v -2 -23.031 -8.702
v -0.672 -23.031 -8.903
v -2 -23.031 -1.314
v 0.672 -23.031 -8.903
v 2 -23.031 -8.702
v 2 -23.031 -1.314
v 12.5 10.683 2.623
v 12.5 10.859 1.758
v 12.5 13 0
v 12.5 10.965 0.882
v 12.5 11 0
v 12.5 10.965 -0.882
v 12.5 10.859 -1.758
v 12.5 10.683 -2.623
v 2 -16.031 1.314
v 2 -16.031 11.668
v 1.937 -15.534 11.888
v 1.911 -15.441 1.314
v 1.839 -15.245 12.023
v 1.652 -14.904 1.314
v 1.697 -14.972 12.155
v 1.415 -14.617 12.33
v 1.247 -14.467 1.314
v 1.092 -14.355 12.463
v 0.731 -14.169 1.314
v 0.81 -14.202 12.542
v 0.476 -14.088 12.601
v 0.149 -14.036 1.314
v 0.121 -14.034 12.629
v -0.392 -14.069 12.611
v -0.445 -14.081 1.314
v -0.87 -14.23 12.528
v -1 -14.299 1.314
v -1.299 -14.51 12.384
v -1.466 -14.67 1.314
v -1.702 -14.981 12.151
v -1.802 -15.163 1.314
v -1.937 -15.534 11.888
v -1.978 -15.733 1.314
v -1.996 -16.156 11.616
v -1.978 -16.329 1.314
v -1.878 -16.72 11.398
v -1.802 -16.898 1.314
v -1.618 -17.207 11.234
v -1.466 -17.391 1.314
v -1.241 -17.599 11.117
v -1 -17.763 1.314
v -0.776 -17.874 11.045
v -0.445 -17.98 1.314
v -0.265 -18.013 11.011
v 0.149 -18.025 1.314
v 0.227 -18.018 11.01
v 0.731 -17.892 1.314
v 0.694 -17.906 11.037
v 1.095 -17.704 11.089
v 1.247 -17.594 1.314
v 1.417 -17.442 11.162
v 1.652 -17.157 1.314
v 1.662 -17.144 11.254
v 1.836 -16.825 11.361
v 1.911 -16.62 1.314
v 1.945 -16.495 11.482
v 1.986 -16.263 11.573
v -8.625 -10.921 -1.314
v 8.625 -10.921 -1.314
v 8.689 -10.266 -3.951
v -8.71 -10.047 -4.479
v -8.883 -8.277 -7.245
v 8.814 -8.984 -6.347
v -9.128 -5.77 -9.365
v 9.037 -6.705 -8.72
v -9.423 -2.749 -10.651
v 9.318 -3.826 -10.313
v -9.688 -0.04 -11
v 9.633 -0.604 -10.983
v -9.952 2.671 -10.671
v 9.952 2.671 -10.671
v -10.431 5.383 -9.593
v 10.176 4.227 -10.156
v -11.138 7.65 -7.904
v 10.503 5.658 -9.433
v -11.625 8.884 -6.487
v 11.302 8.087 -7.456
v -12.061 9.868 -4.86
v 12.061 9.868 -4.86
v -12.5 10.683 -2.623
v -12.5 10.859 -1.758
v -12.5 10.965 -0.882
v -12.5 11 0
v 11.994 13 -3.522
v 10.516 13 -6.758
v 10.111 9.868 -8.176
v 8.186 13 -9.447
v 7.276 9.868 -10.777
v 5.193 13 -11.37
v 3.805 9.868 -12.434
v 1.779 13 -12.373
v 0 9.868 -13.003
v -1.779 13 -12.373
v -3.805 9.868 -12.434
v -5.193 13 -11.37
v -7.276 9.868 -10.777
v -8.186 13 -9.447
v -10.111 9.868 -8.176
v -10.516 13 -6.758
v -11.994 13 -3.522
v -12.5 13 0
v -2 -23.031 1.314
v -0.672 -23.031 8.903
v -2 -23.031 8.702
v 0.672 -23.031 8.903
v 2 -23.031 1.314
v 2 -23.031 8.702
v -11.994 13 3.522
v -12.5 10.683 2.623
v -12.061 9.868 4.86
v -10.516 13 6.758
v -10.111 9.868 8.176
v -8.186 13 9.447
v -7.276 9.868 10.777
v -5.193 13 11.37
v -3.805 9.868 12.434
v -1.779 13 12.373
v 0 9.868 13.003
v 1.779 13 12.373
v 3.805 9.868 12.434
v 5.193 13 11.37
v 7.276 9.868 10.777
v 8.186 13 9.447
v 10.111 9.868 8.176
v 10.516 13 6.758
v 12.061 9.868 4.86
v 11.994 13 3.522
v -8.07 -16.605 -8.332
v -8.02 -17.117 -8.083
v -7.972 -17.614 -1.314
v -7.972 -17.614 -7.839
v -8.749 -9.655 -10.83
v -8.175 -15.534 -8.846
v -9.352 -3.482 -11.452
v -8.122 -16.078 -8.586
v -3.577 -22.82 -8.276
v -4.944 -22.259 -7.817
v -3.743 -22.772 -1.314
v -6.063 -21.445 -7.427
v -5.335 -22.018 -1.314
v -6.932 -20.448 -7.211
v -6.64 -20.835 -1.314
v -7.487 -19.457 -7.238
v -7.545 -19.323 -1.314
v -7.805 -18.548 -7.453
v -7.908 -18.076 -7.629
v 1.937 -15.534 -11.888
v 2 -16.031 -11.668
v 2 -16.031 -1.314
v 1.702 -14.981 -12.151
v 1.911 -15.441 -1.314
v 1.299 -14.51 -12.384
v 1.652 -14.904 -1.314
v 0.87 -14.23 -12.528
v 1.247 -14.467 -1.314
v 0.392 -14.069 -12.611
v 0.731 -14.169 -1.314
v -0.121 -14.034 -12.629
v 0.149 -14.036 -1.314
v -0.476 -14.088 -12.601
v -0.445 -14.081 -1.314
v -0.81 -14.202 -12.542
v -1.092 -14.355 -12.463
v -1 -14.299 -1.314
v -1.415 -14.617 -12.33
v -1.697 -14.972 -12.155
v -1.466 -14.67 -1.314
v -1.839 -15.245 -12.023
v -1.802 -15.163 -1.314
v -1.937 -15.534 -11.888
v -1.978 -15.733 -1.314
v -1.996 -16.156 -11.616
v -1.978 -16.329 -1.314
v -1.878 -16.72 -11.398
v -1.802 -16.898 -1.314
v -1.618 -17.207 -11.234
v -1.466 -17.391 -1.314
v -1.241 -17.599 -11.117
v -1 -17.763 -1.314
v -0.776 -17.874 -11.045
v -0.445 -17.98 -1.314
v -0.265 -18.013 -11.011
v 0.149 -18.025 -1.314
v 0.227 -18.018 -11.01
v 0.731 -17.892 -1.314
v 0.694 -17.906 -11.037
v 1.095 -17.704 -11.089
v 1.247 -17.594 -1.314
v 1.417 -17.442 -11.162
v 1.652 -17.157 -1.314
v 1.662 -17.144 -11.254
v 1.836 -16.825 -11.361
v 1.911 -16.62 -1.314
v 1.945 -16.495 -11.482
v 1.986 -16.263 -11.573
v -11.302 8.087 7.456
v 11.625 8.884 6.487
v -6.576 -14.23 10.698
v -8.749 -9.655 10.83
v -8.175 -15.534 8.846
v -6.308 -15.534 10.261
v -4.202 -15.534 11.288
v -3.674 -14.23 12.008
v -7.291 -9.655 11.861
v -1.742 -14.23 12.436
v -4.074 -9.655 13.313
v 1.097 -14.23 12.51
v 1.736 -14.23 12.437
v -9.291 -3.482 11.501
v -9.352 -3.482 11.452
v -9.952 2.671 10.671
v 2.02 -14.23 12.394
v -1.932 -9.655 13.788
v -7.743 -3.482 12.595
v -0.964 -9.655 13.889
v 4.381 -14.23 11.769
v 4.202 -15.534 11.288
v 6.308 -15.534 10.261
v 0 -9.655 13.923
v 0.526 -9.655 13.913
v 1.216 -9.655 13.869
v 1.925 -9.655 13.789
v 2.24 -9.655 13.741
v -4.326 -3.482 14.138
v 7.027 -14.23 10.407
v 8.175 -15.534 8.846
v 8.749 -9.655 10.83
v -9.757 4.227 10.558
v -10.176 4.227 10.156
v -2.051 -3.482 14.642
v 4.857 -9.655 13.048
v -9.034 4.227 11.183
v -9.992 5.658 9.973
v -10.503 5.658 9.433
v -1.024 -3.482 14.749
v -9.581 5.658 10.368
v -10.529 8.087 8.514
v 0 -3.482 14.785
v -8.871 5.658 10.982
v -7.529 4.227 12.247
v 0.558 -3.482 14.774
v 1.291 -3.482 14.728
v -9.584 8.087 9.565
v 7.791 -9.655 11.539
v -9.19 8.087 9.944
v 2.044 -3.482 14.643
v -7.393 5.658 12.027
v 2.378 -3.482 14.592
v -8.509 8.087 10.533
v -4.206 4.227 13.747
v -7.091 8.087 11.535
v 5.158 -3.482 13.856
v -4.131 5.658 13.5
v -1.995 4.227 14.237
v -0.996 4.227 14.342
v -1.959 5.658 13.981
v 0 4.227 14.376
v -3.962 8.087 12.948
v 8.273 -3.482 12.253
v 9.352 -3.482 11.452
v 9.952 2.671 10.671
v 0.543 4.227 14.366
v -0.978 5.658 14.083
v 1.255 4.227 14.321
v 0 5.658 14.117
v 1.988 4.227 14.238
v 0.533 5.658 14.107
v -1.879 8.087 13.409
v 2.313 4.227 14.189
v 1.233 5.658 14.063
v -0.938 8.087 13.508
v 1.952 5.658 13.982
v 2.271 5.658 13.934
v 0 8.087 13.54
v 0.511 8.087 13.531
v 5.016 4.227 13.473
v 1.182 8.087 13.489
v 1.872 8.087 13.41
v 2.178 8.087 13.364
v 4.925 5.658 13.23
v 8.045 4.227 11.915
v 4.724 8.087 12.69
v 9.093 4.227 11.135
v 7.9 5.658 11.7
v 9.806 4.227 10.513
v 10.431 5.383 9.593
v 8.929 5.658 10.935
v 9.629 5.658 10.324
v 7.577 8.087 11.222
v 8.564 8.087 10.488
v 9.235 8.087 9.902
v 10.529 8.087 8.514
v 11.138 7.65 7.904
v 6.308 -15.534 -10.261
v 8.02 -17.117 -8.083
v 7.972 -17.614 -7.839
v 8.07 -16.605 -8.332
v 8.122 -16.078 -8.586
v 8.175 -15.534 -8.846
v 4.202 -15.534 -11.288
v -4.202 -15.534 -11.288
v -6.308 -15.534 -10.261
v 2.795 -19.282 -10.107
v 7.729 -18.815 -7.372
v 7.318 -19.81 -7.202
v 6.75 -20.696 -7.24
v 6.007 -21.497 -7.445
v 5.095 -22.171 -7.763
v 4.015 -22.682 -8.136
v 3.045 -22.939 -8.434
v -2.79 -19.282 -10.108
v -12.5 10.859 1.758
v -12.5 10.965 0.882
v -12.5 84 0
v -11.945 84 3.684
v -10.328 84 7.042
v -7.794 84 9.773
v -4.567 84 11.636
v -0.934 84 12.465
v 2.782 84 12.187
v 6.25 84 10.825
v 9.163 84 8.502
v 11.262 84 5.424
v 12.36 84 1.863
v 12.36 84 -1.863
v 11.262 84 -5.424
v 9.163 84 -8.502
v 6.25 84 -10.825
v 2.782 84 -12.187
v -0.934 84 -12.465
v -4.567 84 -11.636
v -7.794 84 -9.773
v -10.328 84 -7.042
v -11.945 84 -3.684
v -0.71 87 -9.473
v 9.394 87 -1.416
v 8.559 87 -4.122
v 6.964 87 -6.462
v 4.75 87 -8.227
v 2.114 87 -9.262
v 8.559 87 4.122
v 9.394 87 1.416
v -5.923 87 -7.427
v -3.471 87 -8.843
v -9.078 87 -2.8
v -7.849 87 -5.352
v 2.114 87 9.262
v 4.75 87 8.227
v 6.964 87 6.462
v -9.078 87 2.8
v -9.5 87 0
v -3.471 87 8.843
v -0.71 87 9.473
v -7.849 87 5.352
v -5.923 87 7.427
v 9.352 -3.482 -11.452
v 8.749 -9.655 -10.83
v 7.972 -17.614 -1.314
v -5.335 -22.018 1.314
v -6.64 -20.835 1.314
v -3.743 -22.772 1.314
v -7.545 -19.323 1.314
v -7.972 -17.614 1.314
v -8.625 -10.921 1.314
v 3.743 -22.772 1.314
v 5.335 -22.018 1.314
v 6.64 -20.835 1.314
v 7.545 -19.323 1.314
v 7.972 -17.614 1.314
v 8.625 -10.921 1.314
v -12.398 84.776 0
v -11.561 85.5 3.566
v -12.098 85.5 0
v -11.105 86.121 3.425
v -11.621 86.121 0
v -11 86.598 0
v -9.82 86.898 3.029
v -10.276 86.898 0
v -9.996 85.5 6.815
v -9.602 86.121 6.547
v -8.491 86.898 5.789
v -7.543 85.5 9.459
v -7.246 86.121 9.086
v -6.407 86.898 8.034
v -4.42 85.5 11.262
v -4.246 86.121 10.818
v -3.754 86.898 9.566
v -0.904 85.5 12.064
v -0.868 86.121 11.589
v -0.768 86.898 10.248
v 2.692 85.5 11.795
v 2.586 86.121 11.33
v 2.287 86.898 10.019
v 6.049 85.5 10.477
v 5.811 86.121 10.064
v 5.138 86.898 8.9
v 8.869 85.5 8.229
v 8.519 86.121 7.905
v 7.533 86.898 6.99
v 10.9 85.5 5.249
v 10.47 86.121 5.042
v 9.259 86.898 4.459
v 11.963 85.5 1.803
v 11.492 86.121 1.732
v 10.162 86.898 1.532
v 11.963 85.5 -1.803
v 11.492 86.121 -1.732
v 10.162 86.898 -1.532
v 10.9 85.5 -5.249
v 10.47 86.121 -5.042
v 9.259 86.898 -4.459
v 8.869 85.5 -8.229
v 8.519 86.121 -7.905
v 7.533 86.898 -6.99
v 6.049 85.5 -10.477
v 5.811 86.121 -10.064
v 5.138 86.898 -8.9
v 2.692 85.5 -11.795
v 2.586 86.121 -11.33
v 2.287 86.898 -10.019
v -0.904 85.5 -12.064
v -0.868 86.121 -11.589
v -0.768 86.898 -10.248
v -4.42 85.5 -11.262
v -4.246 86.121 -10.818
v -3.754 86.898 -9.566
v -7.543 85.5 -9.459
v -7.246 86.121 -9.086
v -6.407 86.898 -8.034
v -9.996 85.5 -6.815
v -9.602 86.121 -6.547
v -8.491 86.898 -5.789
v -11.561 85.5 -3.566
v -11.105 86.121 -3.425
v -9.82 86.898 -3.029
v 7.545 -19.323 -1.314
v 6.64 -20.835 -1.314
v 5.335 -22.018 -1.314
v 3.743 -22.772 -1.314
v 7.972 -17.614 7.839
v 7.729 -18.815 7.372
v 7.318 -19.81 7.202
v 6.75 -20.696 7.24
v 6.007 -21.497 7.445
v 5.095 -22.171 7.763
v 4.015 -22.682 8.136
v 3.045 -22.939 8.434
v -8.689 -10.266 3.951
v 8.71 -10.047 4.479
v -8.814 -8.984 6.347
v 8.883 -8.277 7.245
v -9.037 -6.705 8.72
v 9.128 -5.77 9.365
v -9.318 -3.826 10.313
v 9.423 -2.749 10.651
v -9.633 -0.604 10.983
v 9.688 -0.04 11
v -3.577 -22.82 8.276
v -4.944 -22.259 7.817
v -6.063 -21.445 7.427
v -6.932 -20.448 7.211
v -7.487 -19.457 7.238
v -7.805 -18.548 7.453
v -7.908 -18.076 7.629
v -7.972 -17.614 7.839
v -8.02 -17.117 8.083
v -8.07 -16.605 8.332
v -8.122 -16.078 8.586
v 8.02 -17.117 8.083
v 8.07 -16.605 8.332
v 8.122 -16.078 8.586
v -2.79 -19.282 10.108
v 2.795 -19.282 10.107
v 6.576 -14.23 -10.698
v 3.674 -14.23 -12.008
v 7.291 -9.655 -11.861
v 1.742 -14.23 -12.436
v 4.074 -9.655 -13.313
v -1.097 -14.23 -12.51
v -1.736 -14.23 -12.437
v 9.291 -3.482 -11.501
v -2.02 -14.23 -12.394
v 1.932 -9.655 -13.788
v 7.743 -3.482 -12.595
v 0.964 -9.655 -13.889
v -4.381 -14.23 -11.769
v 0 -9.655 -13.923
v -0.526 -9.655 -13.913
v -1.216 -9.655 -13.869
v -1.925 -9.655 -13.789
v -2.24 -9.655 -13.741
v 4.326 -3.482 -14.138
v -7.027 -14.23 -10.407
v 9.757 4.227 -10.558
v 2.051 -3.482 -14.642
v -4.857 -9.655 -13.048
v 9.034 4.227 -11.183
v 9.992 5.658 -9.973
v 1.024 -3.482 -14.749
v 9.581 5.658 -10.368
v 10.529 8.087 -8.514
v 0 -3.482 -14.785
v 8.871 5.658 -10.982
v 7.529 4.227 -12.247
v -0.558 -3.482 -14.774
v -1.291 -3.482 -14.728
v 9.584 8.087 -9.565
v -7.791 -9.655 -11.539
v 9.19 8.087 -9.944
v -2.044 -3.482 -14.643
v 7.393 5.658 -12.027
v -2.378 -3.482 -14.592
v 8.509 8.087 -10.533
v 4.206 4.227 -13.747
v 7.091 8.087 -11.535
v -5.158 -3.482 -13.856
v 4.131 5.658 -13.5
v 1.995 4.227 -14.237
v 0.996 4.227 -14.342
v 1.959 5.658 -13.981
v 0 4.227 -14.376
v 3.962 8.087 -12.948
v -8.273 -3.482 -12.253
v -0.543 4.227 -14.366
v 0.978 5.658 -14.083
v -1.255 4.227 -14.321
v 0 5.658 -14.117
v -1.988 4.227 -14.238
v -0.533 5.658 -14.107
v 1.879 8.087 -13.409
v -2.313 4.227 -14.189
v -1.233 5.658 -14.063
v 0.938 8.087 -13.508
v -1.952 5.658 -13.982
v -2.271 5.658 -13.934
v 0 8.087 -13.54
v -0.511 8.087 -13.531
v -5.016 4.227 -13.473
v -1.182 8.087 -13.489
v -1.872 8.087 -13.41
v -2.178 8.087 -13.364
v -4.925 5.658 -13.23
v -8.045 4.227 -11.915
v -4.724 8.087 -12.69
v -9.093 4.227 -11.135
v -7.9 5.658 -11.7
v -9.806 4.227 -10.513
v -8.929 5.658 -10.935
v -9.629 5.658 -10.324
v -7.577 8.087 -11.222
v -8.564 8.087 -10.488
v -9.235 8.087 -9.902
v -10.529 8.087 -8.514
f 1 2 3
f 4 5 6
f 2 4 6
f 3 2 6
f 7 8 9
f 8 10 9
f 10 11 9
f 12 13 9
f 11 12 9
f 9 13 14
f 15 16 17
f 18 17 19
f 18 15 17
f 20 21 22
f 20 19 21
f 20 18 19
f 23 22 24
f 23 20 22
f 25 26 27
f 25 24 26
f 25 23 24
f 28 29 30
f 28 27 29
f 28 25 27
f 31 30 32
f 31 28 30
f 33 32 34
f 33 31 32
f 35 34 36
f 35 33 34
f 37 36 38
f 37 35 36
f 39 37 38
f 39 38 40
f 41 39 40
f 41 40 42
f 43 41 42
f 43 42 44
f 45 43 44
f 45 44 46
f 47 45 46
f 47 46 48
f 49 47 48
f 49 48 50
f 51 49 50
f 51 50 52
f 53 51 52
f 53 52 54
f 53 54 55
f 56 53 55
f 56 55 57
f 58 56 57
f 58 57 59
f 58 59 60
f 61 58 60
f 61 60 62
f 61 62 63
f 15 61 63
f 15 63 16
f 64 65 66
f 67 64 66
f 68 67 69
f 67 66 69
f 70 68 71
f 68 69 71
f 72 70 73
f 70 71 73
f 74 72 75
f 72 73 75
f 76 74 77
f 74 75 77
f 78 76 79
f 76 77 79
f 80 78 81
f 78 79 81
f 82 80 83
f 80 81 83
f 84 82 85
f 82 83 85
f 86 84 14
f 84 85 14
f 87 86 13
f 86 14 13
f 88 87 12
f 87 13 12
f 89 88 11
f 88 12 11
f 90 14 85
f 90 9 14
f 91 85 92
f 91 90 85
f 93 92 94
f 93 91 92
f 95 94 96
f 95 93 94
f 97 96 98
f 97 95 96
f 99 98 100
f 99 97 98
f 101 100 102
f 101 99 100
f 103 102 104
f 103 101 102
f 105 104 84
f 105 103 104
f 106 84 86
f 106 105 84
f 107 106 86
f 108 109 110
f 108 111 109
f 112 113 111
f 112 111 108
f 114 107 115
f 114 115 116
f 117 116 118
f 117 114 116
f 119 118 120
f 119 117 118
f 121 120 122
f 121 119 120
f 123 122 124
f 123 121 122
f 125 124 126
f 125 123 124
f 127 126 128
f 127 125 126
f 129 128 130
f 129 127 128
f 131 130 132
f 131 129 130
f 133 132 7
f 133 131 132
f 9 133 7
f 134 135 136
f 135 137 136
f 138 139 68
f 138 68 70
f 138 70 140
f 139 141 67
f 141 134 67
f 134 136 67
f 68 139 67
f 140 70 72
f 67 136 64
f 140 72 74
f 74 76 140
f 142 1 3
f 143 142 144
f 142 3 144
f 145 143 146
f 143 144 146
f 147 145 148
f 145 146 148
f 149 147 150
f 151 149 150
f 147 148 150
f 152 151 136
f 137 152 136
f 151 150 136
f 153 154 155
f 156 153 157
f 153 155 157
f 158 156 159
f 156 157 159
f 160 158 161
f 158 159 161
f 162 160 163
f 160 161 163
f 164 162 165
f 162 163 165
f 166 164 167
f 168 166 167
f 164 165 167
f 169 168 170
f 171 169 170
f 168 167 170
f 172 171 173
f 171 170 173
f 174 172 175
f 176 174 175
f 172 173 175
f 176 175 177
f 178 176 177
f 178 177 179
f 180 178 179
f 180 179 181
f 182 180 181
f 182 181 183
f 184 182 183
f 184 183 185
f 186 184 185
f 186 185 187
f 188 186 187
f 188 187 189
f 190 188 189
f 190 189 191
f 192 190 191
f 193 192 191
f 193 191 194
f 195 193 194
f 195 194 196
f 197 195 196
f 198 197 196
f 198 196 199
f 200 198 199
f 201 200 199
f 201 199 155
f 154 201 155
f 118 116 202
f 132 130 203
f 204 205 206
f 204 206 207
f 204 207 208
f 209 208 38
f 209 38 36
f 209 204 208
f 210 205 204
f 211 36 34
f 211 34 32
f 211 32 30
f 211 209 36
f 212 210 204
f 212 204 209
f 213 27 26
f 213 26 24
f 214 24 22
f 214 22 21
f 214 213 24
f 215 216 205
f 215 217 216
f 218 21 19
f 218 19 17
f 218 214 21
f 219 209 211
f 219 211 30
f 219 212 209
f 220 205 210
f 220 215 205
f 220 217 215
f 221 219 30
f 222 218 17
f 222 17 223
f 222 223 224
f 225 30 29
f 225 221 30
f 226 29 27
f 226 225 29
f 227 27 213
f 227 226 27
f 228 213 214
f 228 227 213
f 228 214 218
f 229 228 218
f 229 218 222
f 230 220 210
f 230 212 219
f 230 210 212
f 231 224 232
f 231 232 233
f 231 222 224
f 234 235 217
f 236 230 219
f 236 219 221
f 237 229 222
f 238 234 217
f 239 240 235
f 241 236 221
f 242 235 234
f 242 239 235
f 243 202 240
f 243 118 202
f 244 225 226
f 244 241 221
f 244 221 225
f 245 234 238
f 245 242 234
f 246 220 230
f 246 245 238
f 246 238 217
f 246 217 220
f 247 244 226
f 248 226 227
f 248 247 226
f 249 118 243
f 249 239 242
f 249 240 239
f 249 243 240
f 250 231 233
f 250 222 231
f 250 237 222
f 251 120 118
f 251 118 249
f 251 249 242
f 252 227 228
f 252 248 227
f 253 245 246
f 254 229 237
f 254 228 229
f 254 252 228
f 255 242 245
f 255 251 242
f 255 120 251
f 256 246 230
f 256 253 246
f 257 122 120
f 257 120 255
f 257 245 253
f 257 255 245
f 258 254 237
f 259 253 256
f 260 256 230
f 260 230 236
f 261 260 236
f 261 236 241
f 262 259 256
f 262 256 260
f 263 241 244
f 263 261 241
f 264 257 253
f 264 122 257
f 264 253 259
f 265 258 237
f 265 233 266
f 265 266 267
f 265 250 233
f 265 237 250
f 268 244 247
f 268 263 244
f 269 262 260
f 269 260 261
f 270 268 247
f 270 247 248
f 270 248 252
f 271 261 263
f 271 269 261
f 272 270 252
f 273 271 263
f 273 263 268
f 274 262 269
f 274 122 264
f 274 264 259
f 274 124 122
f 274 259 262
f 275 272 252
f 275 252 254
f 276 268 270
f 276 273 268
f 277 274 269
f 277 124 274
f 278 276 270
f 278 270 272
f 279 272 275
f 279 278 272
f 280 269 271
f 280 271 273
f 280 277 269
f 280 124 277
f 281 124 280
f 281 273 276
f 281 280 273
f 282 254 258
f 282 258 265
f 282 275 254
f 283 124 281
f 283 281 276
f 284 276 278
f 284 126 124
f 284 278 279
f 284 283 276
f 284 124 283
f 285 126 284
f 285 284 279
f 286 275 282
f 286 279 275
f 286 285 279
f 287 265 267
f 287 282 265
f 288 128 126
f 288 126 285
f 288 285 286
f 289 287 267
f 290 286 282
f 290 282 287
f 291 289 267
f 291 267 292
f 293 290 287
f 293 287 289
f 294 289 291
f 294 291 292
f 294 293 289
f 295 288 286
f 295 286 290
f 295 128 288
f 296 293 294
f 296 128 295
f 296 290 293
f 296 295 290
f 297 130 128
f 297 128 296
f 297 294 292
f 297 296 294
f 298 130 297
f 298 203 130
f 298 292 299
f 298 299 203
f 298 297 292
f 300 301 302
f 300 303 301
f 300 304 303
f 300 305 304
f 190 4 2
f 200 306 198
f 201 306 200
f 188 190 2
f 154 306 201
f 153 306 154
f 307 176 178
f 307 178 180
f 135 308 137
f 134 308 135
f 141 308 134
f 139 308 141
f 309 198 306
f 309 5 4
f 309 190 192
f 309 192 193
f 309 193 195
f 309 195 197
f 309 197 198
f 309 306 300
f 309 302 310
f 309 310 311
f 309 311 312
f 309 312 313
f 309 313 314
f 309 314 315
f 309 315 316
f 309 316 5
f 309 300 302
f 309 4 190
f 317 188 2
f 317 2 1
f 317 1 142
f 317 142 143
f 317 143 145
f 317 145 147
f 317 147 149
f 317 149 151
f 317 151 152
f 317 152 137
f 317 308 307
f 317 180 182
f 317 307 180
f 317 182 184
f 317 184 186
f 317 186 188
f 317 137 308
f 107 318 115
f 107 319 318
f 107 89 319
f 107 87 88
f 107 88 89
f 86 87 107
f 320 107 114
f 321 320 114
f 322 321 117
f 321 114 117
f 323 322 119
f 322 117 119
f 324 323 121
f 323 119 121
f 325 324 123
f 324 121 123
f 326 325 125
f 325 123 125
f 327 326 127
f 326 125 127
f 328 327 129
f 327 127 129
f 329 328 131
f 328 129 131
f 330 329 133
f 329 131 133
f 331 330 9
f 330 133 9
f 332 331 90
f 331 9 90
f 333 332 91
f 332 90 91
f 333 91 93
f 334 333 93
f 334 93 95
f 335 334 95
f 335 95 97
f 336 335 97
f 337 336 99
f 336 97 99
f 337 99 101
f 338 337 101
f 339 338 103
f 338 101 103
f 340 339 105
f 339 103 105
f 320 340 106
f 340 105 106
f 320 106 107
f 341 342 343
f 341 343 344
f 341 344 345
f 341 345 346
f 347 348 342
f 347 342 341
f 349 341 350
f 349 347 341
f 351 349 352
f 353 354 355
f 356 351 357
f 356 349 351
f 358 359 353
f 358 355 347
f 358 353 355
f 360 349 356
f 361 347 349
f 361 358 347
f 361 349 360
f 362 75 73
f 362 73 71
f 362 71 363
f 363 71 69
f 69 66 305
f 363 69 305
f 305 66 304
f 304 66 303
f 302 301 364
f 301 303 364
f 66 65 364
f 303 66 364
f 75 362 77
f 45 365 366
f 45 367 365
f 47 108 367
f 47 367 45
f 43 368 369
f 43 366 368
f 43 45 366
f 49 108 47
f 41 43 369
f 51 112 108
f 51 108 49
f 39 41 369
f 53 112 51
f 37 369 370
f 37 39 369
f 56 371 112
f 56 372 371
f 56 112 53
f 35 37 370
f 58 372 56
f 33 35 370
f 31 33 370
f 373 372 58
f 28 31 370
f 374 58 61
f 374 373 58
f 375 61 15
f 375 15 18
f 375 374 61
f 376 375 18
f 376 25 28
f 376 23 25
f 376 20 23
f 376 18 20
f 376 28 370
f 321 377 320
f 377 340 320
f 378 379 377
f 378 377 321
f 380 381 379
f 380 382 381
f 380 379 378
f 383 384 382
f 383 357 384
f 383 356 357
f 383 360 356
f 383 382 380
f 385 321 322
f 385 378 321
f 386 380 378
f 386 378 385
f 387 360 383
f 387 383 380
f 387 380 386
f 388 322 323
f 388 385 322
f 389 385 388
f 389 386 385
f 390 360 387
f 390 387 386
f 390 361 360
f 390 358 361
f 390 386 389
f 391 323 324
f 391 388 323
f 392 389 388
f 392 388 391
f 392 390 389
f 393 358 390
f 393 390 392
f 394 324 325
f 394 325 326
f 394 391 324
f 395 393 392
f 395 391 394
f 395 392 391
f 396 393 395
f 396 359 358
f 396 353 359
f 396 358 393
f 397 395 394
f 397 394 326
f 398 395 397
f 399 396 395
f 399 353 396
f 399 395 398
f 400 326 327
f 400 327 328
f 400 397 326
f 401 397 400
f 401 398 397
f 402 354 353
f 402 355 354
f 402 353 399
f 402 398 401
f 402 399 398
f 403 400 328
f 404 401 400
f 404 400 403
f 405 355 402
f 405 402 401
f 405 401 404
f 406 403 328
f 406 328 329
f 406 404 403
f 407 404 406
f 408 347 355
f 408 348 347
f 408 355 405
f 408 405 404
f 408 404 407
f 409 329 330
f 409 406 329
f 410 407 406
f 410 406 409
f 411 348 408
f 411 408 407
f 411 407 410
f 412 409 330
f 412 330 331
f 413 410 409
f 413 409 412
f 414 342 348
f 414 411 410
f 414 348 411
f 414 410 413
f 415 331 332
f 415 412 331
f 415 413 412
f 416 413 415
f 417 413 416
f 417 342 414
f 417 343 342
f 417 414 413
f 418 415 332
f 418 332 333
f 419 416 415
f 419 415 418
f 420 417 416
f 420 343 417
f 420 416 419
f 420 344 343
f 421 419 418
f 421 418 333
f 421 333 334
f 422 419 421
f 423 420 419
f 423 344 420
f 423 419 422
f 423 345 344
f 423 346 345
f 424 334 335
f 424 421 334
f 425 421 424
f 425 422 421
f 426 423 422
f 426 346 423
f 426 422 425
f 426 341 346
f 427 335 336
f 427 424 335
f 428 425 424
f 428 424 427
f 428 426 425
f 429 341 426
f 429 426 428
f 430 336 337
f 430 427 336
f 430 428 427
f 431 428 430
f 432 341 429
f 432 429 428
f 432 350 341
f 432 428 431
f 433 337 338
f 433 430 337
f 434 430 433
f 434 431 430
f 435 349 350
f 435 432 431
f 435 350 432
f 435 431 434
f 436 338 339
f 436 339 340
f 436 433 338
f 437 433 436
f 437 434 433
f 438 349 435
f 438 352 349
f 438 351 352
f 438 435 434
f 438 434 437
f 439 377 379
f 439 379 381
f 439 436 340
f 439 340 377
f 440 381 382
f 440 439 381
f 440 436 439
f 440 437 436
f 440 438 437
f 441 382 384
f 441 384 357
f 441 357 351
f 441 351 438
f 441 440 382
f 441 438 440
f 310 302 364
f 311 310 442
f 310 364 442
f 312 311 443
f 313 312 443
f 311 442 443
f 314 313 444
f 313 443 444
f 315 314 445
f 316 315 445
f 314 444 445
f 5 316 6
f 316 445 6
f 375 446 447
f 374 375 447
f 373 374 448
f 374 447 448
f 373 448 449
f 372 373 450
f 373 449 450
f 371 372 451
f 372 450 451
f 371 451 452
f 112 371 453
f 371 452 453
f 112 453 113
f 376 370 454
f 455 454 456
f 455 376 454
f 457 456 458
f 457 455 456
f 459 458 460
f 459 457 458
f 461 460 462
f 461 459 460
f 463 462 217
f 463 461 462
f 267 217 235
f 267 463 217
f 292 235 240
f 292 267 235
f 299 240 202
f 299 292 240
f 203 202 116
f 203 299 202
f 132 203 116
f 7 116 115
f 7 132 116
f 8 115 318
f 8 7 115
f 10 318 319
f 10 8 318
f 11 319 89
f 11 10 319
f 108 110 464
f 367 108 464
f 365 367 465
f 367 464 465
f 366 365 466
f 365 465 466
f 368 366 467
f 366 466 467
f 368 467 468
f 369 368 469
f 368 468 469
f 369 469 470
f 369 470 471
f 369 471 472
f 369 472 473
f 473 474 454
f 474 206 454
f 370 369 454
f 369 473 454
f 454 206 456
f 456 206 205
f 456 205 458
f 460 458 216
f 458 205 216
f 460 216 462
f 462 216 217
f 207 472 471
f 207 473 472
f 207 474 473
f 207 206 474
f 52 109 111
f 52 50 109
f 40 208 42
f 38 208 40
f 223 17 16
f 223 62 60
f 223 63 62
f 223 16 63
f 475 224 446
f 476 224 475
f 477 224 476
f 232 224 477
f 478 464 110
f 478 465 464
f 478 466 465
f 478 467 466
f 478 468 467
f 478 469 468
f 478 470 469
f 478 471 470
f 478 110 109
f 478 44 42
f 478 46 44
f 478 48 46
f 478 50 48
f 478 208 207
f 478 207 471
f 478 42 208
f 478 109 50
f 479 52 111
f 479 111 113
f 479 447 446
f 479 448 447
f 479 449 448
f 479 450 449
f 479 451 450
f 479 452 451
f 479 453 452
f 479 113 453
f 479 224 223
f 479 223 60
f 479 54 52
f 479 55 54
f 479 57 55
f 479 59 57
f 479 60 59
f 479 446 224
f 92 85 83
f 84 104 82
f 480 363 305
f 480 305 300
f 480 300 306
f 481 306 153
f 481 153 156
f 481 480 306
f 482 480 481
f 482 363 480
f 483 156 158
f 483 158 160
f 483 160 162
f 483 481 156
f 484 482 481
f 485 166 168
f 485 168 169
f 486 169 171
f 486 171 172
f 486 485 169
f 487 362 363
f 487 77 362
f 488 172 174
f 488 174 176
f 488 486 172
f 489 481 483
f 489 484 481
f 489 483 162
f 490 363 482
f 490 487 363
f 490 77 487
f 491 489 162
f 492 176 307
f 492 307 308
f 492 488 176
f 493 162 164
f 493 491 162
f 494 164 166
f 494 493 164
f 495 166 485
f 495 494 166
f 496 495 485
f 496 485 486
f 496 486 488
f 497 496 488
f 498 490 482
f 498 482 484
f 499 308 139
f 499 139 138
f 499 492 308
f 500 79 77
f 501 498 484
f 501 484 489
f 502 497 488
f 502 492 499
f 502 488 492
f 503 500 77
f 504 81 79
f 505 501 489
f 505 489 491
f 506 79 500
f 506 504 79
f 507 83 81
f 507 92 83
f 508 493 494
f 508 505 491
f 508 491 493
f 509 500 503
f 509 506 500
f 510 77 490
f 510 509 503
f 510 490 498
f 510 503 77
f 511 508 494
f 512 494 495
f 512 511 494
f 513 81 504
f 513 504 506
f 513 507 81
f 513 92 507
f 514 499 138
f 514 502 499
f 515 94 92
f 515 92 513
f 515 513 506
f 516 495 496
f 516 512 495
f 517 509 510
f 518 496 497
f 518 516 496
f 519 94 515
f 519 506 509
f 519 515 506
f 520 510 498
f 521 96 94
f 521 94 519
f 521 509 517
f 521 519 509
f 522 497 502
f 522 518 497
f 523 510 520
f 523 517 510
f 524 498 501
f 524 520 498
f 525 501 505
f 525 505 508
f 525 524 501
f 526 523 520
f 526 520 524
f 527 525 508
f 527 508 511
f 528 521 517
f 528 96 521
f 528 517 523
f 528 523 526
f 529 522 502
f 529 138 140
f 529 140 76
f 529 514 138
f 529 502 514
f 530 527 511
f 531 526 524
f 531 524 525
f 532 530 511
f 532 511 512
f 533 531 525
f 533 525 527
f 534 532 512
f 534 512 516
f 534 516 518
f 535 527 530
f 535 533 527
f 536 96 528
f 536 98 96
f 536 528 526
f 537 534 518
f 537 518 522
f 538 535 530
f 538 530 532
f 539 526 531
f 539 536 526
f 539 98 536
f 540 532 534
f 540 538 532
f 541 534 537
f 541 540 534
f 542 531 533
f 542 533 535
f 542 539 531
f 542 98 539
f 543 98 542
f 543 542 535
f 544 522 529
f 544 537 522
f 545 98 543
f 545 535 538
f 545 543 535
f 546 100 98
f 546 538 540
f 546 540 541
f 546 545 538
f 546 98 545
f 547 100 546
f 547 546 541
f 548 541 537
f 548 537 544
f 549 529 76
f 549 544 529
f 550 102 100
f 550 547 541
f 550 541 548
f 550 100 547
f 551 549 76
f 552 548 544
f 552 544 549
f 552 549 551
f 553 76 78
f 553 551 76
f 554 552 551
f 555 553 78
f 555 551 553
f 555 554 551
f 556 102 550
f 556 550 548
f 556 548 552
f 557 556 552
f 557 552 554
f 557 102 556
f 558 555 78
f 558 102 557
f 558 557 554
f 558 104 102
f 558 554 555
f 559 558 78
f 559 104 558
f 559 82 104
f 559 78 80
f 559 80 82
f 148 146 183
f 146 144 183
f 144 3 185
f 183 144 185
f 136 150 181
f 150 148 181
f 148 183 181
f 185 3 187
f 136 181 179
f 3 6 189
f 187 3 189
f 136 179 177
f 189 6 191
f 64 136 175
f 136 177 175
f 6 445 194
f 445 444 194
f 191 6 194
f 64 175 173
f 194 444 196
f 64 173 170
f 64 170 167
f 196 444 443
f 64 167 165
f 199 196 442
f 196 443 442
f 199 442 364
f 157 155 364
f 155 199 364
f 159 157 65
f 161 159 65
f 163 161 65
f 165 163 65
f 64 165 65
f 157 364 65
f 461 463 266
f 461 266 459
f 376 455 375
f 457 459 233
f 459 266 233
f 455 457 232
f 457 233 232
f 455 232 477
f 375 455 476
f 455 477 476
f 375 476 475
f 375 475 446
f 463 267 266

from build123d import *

# Parameters (mm, degrees)
F1_DEPTH = 12.5
F3_R     = 12.5
F4_DEPTH = 74
F5_R     = 10
F8_R     = 2
F9_DEPTH = 25
F10_R    = 3


with BuildPart() as f1:
    # F0 (on Right) → F1 (new body, symmetric)
    with BuildSketch(Plane.YZ):
        with BuildLine():
            ThreePointArc((-10.9212489831, 1.3138952199), (0.6581265782, 10.9802945956), (11, 0))
            Line((11, 0), (13, 0))
            Line((13, 0), (13, 12.5))
            ThreePointArc((13, 12.5), (-1.3107386008, 15.0012988608), (-15.5343561829, 12.0445374281))
            Line((-15.5343561829, 12.0445374281), (-23.0306010843, 8.9284532397))
            Line((-23.0306010843, 8.9284532397), (-23.0306010843, 1.3138952199))
            Line((-23.0306010843, 1.3138952199), (-10.9212489831, 1.3138952199))
        make_face()
    extrude(amount=F1_DEPTH, both=True)

    # F2: F1 across plane


with BuildPart() as f1_1:
    add(f1.part)
    add(f1.part.mirror(Plane.XY))

    # F3 (on face) → F4 (join)
    with BuildSketch(Plane(origin=(0, 13, 0), x_dir=(-1, 0, 0), z_dir=(0, 1, 0))):
        Circle(F3_R)
    extrude(amount=F4_DEPTH)

    # F5
    f5_edges = [f1_1.edges().sort_by_distance(p)[0] for p in [
        (12.5, -23.030601, 5.121174),
        (-12.5, -23.030601, 5.121174),
        (-12.5, -23.030601, -5.121174),
        (12.5, -23.030601, -5.121174),
    ]]
    fillet(f5_edges, radius=F5_R)

    # F6 (on Right) → F7 (revolve, cut)
    with BuildSketch(Plane.YZ):
        with BuildLine():
            ThreePointArc((9.8683147581, 13.0030242948), (11.414086549, 12.6265569062), (13, 12.5))
            Line((13, 12.5), (46, 12.5))
            Line((46, 12.5), (46, 22.5))
            Line((46, 22.5), (-23.0306010843, 22.5))
            Line((-23.0306010843, 22.5), (-23.0306010843, 8.9284532397))
            Line((-23.0306010843, 8.9284532397), (-15.5343561829, 12.0445374281))
            ThreePointArc((-15.5343561829, 12.0445374281), (-2.9192982664, 14.8103852911), (9.8683147581, 13.0030242948))
        make_face()
    revolve(axis=Axis((0, 5.5, 0), (0, 1, 0)), mode=Mode.SUBTRACT)

    # F8 (on Top) → F9 (cut, symmetric)
    with BuildSketch(Plane.XY):
        with Locations((0, -16.0306010843)):
            Circle(F8_R)
        with BuildLine():
            Line((-7.971597998, -17.6137111518), (-9.9523894576, 2.6714647925))
            Line((-9.9523894576, 2.6714647925), (-25, 0))
            Line((-25, 0), (-25, -50))
            Line((-25, -50), (25, -50))
            Line((25, -50), (25, 0))
            Line((25, 0), (9.9523894576, 2.6714647925))
            Line((9.9523894576, 2.6714647925), (7.971597998, -17.6137111518))
            ThreePointArc((7.971597998, -17.6137111518), (6.0312119514, -21.4746229342), (2, -23.0306010843))
            Line((2, -23.0306010843), (-2, -23.0306010843))
            ThreePointArc((-2, -23.0306010843), (-6.0312119514, -21.4746229342), (-7.971597998, -17.6137111518))
        make_face()
    extrude(amount=F9_DEPTH, both=True, mode=Mode.SUBTRACT)

    # F10
    f10_edges = [f1_1.edges().sort_by_distance(p)[0] for p in [
        (12.5, 87, 0),
    ]]
    fillet(f10_edges, radius=F10_R)


solid = f1_1.part
